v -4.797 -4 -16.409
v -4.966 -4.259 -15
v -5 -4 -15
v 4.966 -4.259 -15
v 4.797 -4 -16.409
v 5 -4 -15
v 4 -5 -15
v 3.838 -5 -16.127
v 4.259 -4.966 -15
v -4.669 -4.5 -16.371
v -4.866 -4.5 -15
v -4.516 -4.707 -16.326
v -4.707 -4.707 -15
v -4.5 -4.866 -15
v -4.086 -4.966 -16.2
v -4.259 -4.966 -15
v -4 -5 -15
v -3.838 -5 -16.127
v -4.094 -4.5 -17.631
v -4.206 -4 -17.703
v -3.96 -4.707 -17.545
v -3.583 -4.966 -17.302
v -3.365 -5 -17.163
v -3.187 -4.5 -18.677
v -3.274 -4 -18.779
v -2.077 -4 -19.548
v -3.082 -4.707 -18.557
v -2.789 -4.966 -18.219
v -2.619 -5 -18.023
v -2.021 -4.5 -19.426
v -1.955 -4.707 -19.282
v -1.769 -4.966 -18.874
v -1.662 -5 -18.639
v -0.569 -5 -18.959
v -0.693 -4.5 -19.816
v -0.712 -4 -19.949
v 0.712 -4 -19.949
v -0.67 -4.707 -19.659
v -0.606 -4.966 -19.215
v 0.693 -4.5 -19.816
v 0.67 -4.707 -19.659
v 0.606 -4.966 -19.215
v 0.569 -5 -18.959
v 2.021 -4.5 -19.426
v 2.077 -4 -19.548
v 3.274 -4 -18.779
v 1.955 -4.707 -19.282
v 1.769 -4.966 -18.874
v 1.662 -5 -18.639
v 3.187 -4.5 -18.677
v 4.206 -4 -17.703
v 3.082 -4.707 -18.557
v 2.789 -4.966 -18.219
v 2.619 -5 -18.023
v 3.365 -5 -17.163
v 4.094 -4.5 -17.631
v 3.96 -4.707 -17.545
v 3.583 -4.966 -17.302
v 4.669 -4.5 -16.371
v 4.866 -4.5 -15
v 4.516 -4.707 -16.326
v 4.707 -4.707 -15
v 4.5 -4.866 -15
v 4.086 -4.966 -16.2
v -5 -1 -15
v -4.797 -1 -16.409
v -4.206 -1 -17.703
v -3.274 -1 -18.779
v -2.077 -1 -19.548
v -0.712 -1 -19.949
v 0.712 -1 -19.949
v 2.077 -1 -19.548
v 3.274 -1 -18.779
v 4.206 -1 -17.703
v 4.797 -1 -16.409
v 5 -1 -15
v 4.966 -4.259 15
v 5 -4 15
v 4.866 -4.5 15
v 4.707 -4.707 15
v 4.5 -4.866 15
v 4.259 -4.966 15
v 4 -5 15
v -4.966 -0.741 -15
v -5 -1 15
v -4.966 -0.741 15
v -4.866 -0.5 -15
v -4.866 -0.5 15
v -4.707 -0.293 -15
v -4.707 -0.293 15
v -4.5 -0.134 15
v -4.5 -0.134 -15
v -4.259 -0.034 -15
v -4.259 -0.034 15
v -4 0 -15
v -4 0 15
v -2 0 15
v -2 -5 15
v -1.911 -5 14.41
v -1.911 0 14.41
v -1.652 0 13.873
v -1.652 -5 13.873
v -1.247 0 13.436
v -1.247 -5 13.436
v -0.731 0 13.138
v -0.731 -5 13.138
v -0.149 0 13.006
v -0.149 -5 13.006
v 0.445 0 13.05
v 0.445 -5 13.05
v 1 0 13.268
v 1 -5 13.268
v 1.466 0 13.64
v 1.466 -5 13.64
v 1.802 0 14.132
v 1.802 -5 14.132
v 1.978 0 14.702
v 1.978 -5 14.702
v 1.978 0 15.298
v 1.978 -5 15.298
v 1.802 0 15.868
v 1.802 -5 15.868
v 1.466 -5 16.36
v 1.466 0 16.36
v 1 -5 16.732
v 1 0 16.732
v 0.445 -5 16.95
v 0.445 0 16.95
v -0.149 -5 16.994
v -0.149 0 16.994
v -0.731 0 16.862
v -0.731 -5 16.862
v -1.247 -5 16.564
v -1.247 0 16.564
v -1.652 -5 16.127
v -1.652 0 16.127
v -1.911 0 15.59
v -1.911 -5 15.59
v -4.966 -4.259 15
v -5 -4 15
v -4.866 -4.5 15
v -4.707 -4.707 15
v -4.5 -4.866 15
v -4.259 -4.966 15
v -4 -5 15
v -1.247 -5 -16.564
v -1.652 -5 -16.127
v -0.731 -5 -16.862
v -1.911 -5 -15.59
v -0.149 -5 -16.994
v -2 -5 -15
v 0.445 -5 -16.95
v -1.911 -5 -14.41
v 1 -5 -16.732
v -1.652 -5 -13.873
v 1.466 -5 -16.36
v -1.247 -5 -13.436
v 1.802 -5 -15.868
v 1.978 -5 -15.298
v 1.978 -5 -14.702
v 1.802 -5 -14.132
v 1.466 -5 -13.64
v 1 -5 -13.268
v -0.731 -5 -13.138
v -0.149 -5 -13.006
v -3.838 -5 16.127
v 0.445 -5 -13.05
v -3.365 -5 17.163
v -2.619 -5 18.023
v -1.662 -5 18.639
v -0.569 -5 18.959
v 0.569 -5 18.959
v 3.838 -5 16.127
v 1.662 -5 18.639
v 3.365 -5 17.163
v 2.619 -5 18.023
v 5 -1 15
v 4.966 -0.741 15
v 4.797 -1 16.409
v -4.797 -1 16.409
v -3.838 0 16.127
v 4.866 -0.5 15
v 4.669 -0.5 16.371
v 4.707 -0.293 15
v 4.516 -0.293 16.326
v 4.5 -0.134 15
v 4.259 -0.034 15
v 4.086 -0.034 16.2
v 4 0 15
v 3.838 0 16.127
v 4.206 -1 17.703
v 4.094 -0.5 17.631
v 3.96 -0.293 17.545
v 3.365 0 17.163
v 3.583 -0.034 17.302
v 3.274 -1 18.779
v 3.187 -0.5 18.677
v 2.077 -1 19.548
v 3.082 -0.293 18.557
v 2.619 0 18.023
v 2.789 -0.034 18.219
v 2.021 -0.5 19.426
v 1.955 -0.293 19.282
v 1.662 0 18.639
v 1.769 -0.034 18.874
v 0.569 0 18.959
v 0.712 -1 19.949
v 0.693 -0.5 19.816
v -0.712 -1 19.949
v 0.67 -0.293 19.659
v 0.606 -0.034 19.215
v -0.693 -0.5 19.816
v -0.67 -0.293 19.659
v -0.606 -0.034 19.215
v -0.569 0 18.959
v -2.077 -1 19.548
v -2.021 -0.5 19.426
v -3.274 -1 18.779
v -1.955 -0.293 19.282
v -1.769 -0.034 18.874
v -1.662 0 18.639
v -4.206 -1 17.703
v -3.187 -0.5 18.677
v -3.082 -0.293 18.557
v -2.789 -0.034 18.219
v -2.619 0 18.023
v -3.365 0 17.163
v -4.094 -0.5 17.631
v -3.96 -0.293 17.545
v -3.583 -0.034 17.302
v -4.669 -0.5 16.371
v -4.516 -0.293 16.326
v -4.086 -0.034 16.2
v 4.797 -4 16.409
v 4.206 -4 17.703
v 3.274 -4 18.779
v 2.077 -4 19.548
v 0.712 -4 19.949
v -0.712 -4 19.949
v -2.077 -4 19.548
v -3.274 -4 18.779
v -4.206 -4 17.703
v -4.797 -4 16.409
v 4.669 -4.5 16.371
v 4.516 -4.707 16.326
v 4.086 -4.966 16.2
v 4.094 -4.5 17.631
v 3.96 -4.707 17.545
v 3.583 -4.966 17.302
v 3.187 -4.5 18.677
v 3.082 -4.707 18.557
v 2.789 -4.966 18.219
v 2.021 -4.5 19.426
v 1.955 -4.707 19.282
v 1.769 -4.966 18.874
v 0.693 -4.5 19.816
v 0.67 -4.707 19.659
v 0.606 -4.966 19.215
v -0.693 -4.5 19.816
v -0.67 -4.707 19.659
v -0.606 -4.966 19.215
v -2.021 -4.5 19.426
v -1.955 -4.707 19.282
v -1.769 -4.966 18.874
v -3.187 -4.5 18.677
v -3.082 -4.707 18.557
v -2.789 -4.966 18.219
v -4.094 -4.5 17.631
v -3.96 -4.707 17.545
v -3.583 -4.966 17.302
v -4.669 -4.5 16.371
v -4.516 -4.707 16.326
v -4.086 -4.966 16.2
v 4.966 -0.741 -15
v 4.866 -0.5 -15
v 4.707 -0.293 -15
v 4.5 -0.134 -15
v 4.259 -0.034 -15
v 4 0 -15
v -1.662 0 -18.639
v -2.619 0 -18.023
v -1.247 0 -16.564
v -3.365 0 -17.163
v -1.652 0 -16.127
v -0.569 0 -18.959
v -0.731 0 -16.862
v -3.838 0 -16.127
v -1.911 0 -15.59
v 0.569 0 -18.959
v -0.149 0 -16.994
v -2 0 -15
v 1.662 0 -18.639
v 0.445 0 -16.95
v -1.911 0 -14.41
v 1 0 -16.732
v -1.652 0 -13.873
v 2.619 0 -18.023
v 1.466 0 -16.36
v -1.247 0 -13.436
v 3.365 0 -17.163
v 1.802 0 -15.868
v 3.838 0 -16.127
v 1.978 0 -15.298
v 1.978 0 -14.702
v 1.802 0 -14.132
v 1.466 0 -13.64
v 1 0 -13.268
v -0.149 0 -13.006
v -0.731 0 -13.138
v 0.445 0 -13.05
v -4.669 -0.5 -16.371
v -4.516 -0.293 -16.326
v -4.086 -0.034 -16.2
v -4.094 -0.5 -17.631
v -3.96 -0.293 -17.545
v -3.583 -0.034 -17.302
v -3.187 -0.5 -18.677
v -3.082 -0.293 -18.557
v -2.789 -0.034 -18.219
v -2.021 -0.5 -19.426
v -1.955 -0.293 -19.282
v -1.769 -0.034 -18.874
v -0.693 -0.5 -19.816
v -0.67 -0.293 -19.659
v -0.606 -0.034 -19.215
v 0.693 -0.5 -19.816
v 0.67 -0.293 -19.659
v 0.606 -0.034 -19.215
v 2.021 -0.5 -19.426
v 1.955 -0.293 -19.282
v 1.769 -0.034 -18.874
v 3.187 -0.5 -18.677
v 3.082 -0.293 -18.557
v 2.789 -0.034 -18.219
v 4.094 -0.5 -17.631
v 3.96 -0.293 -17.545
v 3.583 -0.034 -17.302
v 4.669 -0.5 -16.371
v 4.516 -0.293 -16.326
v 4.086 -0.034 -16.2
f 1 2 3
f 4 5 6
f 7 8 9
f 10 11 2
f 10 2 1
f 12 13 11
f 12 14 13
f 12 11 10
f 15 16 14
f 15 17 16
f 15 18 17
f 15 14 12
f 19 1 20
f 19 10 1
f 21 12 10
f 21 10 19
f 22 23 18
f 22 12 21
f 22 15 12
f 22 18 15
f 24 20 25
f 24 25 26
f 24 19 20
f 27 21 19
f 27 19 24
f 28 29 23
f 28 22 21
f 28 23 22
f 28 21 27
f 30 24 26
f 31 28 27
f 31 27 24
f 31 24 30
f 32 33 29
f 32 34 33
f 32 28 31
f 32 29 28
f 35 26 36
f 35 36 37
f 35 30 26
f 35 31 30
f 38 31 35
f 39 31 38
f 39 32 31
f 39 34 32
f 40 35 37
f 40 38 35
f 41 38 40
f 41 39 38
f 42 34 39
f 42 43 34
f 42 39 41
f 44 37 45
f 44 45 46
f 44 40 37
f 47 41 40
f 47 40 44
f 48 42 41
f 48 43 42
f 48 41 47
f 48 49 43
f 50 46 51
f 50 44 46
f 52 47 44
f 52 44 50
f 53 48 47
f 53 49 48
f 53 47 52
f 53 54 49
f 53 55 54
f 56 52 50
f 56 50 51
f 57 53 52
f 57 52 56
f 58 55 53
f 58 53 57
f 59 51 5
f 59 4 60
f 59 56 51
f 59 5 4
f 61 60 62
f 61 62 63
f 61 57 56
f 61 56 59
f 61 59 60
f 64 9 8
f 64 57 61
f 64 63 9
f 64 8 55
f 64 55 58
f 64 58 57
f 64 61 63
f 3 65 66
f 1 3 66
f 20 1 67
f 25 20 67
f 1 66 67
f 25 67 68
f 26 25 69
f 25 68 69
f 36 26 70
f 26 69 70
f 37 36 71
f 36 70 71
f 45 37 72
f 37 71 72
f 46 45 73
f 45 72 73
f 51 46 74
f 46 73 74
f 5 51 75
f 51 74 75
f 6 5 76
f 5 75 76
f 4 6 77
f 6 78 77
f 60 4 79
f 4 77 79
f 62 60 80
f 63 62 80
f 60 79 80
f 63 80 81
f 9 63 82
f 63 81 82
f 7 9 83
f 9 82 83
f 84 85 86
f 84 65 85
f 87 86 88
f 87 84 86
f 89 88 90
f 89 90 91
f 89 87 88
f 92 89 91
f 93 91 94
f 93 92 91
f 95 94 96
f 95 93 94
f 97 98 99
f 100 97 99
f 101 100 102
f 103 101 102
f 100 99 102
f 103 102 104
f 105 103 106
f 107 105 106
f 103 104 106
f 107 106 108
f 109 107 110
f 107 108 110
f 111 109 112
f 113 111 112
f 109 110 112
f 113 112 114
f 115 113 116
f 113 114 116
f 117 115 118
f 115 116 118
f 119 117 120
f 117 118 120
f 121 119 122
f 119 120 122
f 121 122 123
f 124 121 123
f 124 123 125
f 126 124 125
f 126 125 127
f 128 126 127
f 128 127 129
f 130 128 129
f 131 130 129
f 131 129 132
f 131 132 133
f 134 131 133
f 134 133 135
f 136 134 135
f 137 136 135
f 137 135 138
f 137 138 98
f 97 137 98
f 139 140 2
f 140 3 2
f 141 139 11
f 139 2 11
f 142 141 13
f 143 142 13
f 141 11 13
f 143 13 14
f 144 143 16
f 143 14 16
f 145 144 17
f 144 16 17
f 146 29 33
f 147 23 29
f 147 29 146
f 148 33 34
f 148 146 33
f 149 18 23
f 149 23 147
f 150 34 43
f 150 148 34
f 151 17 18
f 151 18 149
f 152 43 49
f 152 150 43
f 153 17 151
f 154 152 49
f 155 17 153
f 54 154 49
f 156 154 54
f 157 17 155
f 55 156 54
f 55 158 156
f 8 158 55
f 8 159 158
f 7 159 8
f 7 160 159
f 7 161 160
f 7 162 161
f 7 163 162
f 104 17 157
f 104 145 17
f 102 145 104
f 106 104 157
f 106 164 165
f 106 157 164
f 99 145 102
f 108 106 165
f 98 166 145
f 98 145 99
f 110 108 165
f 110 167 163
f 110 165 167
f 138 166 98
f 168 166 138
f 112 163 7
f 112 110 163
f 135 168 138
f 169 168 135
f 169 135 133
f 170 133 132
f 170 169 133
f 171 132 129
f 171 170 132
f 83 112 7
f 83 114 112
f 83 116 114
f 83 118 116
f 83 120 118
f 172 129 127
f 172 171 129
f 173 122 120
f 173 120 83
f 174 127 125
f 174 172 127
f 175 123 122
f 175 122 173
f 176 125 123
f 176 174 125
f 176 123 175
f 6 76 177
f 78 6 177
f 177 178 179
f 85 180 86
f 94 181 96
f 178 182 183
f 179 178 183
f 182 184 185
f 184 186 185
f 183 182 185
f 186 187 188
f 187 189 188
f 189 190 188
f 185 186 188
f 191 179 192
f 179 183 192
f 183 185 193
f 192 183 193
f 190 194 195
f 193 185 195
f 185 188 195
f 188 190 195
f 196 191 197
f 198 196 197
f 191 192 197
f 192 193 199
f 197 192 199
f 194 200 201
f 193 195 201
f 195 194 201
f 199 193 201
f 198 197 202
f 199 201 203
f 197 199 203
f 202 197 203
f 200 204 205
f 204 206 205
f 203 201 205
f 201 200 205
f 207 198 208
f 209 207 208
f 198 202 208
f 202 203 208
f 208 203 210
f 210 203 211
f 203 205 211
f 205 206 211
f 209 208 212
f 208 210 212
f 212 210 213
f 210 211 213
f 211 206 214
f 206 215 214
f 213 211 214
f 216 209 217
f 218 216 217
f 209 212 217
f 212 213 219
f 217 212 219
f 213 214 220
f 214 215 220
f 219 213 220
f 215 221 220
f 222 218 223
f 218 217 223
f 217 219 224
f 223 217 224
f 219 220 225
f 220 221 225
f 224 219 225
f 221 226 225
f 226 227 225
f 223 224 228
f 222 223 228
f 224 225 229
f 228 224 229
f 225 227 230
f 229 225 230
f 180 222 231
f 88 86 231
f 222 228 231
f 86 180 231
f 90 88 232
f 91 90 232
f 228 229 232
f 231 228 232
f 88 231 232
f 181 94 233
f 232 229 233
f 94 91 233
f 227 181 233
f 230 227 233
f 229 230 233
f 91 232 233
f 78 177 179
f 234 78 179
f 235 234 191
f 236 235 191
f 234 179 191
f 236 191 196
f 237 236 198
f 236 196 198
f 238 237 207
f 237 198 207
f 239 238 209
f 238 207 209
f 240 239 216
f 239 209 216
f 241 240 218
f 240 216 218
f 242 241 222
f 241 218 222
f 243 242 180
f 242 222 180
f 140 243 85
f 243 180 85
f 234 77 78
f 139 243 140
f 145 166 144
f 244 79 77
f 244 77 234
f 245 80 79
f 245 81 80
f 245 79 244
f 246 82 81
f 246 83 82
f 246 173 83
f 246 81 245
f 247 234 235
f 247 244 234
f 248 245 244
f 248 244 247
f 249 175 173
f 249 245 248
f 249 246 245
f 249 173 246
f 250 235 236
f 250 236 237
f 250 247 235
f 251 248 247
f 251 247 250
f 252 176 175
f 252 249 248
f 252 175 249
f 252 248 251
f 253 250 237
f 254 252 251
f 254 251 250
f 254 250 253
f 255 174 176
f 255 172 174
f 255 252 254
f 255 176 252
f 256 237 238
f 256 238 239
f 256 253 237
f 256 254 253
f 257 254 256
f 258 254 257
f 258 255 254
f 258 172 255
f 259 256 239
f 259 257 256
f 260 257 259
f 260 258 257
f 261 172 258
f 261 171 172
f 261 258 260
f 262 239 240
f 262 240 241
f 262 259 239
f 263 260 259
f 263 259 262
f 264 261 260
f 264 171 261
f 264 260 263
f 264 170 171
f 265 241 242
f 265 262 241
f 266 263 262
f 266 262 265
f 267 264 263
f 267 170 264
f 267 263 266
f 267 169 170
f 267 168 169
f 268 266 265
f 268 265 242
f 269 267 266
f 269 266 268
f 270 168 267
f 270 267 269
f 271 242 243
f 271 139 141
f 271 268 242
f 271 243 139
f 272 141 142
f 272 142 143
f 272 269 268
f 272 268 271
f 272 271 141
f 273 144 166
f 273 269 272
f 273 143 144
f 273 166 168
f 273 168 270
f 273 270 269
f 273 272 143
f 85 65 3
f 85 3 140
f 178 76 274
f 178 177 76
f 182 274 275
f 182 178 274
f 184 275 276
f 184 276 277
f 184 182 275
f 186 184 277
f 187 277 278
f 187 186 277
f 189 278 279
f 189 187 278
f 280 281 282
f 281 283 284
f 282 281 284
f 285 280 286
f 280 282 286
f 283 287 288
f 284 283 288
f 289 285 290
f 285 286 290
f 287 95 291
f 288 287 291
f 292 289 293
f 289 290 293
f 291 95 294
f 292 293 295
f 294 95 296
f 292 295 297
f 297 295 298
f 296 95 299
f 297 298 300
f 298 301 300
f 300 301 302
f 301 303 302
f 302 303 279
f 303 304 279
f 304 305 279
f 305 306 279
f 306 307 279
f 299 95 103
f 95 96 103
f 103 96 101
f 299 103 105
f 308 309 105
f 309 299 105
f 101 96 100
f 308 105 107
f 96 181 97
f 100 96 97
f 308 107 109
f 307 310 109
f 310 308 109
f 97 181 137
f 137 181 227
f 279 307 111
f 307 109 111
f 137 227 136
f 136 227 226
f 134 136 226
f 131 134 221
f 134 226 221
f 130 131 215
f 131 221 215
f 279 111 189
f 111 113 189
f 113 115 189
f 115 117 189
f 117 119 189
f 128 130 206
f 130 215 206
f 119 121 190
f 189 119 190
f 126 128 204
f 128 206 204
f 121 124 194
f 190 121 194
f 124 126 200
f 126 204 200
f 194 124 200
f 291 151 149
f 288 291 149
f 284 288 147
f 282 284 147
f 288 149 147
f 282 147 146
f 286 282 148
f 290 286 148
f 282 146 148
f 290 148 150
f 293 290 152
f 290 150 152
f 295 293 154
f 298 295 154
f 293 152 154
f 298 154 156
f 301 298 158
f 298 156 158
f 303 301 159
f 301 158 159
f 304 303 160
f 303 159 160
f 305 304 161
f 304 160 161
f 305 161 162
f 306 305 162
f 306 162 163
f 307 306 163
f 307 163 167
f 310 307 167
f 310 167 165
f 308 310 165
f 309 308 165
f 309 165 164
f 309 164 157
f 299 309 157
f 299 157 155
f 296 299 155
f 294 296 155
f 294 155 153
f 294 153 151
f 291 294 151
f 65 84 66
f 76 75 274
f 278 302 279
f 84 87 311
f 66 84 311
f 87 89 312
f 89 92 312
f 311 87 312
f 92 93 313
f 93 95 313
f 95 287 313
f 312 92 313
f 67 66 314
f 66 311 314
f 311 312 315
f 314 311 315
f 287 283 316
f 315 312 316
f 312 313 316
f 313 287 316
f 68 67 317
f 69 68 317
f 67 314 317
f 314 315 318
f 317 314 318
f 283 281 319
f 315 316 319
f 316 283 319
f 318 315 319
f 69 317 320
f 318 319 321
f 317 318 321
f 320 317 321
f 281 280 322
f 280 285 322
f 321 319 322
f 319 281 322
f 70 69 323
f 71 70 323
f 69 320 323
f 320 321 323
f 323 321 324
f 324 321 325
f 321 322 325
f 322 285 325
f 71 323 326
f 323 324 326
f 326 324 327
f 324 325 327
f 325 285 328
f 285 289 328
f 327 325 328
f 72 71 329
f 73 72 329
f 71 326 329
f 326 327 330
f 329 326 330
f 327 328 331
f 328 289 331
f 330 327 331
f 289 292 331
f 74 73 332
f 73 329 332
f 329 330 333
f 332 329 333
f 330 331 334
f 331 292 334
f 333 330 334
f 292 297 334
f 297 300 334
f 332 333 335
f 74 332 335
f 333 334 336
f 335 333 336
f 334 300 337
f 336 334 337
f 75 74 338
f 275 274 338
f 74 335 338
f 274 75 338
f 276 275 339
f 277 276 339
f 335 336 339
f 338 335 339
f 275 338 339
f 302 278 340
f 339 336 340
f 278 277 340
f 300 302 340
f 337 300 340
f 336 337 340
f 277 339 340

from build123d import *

# Parameters (mm, degrees)
F0_W     = 10
F0_H     = 30
F1_DEPTH = 5
F3_D     = 4
F4_R     = 1


# Not quite as in the source:
# - a feature of the source that left no trace in its solid (it failed there, or was rolled back) is left out


with BuildPart() as f1:
    # F0 (on Front) → F1 (new body)
    with BuildSketch(Plane.XZ):
        with BuildLine():
            Line((5, -15), (-5, -15))
            ThreePointArc((-5, -15), (0, -20), (5, -15))
        make_face()
        with BuildLine():
            ThreePointArc((5, 15), (0, 20), (-5, 15))
            Line((-5, 15), (5, 15))
        make_face()
        Rectangle(F0_W, F0_H)
    extrude(amount=F1_DEPTH)

    # F3 (through all)
    with Locations(Plane(origin=(0, 0, 0), x_dir=(1, 0, 0), z_dir=(0, 1, 0))):
        with Locations((0, -15), (0, 15)):
            Hole(F3_D / 2)

    # F4
    f4_edges = [f1.edges().sort_by_distance(p)[0] for p in [
        (5, -5, 0),
        (5, 0, 0),
        (0, 0, -20),
        (0, -5, -20),
        (-5, 0, 0),
        (-5, -5, 0),
        (0, 0, 20),
        (0, -5, 20),
    ]]
    fillet(f4_edges, radius=F4_R)


solid = f1.part
